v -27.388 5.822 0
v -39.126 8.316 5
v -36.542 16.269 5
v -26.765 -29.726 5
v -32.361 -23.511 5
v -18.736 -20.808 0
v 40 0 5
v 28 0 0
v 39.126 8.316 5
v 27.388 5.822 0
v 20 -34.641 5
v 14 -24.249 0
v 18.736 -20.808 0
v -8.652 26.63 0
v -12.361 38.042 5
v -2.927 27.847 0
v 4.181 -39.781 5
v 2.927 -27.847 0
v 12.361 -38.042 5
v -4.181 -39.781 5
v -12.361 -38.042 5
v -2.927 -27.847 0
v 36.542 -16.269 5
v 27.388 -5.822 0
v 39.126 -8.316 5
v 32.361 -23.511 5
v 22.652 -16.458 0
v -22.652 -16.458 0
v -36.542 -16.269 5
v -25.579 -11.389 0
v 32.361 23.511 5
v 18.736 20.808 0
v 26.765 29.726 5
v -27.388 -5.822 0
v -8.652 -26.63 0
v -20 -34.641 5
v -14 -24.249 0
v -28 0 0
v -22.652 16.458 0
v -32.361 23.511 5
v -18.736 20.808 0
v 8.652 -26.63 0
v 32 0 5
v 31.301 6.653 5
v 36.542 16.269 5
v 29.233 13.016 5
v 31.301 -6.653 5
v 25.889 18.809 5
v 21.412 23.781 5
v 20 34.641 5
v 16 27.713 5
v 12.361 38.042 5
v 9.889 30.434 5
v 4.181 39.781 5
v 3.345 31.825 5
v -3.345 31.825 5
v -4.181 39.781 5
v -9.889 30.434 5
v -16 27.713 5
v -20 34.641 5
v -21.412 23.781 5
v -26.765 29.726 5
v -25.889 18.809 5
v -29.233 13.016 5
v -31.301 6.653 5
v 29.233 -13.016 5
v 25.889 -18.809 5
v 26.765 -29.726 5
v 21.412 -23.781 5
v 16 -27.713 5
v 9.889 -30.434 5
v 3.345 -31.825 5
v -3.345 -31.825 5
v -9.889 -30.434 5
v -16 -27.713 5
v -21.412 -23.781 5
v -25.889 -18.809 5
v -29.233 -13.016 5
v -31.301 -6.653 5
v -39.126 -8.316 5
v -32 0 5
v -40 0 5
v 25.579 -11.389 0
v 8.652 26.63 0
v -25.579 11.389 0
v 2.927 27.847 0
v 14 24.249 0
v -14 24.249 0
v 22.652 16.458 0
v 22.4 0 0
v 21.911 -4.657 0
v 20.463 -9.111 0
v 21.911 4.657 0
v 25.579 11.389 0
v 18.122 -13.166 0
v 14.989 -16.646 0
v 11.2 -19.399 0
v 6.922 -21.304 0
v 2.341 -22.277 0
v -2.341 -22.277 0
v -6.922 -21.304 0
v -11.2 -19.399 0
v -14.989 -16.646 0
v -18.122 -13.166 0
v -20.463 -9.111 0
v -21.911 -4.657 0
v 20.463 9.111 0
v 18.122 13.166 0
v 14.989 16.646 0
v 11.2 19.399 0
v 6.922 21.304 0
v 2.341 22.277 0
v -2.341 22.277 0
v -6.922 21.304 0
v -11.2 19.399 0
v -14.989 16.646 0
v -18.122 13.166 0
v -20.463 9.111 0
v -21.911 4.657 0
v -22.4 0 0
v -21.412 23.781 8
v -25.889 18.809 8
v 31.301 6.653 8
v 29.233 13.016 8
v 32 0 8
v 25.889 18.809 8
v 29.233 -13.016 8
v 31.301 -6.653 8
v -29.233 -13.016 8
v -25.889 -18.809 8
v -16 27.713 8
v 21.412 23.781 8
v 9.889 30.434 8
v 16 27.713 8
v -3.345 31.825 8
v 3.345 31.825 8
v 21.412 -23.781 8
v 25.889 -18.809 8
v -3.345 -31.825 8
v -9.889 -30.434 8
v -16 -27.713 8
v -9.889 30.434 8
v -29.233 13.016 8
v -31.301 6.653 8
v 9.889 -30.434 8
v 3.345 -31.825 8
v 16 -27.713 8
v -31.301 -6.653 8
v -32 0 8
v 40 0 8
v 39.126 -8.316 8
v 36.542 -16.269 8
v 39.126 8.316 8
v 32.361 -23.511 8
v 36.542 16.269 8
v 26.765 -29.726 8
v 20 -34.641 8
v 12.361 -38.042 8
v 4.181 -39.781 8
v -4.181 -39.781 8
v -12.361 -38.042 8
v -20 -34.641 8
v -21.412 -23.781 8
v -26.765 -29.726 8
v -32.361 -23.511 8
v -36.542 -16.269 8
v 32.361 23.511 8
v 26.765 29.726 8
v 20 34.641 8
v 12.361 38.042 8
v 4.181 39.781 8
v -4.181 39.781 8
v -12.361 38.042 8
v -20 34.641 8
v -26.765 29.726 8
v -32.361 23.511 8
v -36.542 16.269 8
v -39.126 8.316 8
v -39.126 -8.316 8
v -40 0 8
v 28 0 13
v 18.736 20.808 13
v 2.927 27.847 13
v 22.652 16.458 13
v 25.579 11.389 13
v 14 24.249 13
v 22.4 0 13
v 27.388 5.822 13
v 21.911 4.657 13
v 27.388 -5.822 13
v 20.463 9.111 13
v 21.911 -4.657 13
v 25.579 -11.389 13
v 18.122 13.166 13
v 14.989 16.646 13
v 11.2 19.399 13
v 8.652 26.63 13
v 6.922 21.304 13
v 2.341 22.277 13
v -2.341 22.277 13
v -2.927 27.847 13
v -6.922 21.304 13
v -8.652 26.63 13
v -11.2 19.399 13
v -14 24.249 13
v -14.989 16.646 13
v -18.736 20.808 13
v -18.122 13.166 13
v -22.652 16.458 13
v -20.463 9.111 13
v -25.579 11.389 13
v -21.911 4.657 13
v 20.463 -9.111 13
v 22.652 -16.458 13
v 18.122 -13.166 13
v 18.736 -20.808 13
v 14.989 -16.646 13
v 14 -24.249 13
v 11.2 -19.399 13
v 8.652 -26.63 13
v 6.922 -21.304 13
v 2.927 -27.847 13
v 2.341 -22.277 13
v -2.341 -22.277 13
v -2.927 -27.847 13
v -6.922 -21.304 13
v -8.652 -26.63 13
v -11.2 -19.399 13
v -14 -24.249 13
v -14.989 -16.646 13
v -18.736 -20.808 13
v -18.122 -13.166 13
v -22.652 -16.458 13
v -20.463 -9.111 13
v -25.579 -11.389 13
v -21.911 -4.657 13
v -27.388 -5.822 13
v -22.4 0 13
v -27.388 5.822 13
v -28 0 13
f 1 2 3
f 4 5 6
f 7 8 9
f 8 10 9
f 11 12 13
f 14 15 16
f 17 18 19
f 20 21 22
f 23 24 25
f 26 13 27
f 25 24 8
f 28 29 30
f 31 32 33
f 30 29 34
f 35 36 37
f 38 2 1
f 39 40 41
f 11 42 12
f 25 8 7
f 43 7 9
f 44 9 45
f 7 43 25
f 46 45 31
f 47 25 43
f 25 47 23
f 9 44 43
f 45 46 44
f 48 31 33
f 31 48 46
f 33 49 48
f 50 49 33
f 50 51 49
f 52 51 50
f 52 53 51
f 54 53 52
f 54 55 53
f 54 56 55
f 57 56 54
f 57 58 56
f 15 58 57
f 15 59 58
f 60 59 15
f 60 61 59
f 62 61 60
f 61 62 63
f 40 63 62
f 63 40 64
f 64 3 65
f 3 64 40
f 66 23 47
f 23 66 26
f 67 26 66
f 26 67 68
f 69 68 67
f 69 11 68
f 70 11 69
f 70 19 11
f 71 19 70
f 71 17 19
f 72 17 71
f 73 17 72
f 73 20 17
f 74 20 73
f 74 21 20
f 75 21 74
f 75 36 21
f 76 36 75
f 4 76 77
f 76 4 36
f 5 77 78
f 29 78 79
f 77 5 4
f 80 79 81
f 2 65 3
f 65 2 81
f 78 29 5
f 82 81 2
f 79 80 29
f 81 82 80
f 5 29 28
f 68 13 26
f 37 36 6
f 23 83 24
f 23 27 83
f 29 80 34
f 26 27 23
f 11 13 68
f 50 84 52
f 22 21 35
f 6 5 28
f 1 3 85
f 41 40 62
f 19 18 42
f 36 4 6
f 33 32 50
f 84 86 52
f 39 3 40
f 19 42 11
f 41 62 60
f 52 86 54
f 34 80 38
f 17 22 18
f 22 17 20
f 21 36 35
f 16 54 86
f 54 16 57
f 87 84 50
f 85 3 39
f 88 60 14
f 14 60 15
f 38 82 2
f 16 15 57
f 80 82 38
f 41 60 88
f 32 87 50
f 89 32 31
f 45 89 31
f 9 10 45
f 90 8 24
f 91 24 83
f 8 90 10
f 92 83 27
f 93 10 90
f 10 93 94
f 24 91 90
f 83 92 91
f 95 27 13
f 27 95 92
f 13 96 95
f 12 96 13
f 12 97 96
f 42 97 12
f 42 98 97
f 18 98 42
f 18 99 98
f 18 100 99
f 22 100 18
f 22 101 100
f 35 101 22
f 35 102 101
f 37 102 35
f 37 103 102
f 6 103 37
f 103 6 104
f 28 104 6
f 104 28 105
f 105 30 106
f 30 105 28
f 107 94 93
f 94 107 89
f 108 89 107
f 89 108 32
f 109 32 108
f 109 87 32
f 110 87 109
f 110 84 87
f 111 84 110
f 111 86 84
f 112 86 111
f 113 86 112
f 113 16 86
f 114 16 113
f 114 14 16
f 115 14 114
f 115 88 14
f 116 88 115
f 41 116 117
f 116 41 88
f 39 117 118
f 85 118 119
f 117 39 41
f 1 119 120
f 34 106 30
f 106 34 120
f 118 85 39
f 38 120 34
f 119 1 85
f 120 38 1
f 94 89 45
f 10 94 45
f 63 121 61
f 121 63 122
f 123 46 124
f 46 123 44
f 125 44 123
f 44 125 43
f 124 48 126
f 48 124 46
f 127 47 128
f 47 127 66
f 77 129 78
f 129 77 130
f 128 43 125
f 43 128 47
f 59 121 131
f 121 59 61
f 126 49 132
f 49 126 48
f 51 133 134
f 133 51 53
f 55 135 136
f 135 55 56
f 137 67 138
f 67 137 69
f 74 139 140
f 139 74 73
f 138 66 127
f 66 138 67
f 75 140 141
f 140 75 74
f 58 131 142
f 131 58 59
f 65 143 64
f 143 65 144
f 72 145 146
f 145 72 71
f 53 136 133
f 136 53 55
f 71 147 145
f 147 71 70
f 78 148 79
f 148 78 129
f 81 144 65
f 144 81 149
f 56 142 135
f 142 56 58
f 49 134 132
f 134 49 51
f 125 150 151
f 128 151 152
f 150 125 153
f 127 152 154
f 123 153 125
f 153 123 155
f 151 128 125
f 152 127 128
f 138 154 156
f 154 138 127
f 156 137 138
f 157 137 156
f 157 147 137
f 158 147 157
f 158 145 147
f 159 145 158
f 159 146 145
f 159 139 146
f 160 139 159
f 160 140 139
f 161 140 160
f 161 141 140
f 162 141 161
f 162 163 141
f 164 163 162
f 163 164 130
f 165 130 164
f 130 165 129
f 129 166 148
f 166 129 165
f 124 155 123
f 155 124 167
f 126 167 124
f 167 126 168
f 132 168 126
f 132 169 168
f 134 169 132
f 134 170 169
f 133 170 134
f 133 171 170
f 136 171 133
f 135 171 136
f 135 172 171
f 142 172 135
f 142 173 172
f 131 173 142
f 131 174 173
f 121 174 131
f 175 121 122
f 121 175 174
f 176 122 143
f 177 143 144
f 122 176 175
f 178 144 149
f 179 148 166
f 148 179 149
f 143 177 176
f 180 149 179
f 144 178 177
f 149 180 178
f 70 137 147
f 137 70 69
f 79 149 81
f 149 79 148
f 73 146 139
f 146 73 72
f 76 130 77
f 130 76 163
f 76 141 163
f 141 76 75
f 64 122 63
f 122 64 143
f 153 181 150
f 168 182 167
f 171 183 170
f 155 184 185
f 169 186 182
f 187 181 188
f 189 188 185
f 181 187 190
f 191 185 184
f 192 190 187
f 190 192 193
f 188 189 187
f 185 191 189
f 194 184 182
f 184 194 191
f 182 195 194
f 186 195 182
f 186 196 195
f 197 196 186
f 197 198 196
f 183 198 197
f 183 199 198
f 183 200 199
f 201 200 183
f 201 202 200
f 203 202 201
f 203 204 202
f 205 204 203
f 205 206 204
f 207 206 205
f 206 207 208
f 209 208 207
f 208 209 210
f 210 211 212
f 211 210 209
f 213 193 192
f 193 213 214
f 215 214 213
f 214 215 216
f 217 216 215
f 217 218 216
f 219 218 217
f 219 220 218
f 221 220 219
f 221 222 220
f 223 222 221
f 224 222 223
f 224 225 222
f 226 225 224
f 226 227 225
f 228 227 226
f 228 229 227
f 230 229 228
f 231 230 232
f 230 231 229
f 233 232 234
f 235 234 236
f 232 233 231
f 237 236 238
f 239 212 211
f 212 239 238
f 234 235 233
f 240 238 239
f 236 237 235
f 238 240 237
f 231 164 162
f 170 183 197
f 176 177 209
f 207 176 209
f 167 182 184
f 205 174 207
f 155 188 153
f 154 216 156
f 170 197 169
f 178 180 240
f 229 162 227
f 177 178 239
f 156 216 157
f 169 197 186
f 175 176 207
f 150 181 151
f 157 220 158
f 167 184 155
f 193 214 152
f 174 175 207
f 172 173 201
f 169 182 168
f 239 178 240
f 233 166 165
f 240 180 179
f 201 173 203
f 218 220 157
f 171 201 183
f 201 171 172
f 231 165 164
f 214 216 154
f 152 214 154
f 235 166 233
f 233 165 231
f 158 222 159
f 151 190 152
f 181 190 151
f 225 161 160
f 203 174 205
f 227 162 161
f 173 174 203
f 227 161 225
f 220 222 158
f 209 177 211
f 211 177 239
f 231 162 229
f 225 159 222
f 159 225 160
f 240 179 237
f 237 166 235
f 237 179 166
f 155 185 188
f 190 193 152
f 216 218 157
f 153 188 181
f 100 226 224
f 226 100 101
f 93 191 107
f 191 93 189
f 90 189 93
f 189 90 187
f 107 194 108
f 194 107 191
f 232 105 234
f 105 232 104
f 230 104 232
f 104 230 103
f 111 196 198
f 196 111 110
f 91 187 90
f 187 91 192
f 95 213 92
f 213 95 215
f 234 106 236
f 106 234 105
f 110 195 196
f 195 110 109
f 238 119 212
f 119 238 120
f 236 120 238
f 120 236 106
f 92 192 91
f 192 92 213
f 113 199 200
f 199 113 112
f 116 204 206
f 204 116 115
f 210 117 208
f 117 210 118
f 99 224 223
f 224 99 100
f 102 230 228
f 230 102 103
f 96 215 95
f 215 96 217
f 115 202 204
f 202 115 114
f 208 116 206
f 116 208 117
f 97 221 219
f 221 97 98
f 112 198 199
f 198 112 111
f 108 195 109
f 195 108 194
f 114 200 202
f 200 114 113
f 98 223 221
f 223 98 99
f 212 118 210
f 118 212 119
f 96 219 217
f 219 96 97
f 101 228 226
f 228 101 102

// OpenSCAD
//CUSTOMIZER VARIABLES

top_height=5; // [0:30]
groove_height=3; // [0:30]
top_width=40; // [0:100]
mid_width=32; // [0:100]

//CUSTOMIZER VARIABLES END

grommet_cap(top_height,mid_width,top_width,groove_height);

module top(h=5,r=10) {
  cylinder(h,.7*r,r);
}

module bottom(h=5,r=10) {
  cylinder(h,r,.7*r);
}

module mid(h=3,r=7) {
  cylinder(h,r,r);
}

module solid(h=5,r1=10,r2=15,g=3) {
  union() {
    top(h,r2);
    translate([0,0,h]) mid(g,r1);
    translate([0,0,h+g]) bottom(h,r2);
  }
}

module grommet_cap(h,r1,r2,g) {
  difference() {
    solid(h,r1,r2,g);
    translate([0,0,-1]) cylinder(2*(h+g),.7*r1,.7*r1);
  }
}
